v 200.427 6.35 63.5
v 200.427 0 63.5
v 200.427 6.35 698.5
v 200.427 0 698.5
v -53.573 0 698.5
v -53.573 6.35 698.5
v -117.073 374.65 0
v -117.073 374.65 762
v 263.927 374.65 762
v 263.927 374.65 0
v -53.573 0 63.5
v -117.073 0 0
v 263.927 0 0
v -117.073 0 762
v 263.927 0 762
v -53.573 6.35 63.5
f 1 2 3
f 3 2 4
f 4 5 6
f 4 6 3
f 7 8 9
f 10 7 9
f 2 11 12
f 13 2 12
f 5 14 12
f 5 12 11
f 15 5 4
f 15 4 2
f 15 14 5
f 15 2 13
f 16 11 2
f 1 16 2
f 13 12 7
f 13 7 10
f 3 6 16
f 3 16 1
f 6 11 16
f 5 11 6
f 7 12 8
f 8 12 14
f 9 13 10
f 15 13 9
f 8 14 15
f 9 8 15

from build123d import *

# Parameters (mm, degrees)
F0_W     = 381
F0_H     = 762
F0_W_2   = 254
F0_H_2   = 635
F1_DEPTH = 374.65
F2_DEPTH = 6.35


# Not quite as in the source:
# - a feature names something its author has since deleted; it is built from what else it names


with BuildPart() as f1:
    # F0 (on Front) → F1 (new body)
    with BuildSketch(Plane.XZ):
        with Locations((73.4267770052, 381)):
            Rectangle(F0_W, F0_H)
        with Locations((73.4267770052, 381)):
            Rectangle(F0_W_2, F0_H_2, mode=Mode.SUBTRACT)
        with Locations((73.4267770052, 381)):
            Rectangle(F0_W_2, F0_H_2)
    extrude(amount=-F1_DEPTH)

    # F0 (on Front) → F2 (cut)
    with BuildSketch(Plane.XZ):
        with Locations((73.4267770052, 381)):
            Rectangle(F0_W_2, F0_H_2)
    extrude(amount=-F2_DEPTH, mode=Mode.SUBTRACT)


solid = f1.part
